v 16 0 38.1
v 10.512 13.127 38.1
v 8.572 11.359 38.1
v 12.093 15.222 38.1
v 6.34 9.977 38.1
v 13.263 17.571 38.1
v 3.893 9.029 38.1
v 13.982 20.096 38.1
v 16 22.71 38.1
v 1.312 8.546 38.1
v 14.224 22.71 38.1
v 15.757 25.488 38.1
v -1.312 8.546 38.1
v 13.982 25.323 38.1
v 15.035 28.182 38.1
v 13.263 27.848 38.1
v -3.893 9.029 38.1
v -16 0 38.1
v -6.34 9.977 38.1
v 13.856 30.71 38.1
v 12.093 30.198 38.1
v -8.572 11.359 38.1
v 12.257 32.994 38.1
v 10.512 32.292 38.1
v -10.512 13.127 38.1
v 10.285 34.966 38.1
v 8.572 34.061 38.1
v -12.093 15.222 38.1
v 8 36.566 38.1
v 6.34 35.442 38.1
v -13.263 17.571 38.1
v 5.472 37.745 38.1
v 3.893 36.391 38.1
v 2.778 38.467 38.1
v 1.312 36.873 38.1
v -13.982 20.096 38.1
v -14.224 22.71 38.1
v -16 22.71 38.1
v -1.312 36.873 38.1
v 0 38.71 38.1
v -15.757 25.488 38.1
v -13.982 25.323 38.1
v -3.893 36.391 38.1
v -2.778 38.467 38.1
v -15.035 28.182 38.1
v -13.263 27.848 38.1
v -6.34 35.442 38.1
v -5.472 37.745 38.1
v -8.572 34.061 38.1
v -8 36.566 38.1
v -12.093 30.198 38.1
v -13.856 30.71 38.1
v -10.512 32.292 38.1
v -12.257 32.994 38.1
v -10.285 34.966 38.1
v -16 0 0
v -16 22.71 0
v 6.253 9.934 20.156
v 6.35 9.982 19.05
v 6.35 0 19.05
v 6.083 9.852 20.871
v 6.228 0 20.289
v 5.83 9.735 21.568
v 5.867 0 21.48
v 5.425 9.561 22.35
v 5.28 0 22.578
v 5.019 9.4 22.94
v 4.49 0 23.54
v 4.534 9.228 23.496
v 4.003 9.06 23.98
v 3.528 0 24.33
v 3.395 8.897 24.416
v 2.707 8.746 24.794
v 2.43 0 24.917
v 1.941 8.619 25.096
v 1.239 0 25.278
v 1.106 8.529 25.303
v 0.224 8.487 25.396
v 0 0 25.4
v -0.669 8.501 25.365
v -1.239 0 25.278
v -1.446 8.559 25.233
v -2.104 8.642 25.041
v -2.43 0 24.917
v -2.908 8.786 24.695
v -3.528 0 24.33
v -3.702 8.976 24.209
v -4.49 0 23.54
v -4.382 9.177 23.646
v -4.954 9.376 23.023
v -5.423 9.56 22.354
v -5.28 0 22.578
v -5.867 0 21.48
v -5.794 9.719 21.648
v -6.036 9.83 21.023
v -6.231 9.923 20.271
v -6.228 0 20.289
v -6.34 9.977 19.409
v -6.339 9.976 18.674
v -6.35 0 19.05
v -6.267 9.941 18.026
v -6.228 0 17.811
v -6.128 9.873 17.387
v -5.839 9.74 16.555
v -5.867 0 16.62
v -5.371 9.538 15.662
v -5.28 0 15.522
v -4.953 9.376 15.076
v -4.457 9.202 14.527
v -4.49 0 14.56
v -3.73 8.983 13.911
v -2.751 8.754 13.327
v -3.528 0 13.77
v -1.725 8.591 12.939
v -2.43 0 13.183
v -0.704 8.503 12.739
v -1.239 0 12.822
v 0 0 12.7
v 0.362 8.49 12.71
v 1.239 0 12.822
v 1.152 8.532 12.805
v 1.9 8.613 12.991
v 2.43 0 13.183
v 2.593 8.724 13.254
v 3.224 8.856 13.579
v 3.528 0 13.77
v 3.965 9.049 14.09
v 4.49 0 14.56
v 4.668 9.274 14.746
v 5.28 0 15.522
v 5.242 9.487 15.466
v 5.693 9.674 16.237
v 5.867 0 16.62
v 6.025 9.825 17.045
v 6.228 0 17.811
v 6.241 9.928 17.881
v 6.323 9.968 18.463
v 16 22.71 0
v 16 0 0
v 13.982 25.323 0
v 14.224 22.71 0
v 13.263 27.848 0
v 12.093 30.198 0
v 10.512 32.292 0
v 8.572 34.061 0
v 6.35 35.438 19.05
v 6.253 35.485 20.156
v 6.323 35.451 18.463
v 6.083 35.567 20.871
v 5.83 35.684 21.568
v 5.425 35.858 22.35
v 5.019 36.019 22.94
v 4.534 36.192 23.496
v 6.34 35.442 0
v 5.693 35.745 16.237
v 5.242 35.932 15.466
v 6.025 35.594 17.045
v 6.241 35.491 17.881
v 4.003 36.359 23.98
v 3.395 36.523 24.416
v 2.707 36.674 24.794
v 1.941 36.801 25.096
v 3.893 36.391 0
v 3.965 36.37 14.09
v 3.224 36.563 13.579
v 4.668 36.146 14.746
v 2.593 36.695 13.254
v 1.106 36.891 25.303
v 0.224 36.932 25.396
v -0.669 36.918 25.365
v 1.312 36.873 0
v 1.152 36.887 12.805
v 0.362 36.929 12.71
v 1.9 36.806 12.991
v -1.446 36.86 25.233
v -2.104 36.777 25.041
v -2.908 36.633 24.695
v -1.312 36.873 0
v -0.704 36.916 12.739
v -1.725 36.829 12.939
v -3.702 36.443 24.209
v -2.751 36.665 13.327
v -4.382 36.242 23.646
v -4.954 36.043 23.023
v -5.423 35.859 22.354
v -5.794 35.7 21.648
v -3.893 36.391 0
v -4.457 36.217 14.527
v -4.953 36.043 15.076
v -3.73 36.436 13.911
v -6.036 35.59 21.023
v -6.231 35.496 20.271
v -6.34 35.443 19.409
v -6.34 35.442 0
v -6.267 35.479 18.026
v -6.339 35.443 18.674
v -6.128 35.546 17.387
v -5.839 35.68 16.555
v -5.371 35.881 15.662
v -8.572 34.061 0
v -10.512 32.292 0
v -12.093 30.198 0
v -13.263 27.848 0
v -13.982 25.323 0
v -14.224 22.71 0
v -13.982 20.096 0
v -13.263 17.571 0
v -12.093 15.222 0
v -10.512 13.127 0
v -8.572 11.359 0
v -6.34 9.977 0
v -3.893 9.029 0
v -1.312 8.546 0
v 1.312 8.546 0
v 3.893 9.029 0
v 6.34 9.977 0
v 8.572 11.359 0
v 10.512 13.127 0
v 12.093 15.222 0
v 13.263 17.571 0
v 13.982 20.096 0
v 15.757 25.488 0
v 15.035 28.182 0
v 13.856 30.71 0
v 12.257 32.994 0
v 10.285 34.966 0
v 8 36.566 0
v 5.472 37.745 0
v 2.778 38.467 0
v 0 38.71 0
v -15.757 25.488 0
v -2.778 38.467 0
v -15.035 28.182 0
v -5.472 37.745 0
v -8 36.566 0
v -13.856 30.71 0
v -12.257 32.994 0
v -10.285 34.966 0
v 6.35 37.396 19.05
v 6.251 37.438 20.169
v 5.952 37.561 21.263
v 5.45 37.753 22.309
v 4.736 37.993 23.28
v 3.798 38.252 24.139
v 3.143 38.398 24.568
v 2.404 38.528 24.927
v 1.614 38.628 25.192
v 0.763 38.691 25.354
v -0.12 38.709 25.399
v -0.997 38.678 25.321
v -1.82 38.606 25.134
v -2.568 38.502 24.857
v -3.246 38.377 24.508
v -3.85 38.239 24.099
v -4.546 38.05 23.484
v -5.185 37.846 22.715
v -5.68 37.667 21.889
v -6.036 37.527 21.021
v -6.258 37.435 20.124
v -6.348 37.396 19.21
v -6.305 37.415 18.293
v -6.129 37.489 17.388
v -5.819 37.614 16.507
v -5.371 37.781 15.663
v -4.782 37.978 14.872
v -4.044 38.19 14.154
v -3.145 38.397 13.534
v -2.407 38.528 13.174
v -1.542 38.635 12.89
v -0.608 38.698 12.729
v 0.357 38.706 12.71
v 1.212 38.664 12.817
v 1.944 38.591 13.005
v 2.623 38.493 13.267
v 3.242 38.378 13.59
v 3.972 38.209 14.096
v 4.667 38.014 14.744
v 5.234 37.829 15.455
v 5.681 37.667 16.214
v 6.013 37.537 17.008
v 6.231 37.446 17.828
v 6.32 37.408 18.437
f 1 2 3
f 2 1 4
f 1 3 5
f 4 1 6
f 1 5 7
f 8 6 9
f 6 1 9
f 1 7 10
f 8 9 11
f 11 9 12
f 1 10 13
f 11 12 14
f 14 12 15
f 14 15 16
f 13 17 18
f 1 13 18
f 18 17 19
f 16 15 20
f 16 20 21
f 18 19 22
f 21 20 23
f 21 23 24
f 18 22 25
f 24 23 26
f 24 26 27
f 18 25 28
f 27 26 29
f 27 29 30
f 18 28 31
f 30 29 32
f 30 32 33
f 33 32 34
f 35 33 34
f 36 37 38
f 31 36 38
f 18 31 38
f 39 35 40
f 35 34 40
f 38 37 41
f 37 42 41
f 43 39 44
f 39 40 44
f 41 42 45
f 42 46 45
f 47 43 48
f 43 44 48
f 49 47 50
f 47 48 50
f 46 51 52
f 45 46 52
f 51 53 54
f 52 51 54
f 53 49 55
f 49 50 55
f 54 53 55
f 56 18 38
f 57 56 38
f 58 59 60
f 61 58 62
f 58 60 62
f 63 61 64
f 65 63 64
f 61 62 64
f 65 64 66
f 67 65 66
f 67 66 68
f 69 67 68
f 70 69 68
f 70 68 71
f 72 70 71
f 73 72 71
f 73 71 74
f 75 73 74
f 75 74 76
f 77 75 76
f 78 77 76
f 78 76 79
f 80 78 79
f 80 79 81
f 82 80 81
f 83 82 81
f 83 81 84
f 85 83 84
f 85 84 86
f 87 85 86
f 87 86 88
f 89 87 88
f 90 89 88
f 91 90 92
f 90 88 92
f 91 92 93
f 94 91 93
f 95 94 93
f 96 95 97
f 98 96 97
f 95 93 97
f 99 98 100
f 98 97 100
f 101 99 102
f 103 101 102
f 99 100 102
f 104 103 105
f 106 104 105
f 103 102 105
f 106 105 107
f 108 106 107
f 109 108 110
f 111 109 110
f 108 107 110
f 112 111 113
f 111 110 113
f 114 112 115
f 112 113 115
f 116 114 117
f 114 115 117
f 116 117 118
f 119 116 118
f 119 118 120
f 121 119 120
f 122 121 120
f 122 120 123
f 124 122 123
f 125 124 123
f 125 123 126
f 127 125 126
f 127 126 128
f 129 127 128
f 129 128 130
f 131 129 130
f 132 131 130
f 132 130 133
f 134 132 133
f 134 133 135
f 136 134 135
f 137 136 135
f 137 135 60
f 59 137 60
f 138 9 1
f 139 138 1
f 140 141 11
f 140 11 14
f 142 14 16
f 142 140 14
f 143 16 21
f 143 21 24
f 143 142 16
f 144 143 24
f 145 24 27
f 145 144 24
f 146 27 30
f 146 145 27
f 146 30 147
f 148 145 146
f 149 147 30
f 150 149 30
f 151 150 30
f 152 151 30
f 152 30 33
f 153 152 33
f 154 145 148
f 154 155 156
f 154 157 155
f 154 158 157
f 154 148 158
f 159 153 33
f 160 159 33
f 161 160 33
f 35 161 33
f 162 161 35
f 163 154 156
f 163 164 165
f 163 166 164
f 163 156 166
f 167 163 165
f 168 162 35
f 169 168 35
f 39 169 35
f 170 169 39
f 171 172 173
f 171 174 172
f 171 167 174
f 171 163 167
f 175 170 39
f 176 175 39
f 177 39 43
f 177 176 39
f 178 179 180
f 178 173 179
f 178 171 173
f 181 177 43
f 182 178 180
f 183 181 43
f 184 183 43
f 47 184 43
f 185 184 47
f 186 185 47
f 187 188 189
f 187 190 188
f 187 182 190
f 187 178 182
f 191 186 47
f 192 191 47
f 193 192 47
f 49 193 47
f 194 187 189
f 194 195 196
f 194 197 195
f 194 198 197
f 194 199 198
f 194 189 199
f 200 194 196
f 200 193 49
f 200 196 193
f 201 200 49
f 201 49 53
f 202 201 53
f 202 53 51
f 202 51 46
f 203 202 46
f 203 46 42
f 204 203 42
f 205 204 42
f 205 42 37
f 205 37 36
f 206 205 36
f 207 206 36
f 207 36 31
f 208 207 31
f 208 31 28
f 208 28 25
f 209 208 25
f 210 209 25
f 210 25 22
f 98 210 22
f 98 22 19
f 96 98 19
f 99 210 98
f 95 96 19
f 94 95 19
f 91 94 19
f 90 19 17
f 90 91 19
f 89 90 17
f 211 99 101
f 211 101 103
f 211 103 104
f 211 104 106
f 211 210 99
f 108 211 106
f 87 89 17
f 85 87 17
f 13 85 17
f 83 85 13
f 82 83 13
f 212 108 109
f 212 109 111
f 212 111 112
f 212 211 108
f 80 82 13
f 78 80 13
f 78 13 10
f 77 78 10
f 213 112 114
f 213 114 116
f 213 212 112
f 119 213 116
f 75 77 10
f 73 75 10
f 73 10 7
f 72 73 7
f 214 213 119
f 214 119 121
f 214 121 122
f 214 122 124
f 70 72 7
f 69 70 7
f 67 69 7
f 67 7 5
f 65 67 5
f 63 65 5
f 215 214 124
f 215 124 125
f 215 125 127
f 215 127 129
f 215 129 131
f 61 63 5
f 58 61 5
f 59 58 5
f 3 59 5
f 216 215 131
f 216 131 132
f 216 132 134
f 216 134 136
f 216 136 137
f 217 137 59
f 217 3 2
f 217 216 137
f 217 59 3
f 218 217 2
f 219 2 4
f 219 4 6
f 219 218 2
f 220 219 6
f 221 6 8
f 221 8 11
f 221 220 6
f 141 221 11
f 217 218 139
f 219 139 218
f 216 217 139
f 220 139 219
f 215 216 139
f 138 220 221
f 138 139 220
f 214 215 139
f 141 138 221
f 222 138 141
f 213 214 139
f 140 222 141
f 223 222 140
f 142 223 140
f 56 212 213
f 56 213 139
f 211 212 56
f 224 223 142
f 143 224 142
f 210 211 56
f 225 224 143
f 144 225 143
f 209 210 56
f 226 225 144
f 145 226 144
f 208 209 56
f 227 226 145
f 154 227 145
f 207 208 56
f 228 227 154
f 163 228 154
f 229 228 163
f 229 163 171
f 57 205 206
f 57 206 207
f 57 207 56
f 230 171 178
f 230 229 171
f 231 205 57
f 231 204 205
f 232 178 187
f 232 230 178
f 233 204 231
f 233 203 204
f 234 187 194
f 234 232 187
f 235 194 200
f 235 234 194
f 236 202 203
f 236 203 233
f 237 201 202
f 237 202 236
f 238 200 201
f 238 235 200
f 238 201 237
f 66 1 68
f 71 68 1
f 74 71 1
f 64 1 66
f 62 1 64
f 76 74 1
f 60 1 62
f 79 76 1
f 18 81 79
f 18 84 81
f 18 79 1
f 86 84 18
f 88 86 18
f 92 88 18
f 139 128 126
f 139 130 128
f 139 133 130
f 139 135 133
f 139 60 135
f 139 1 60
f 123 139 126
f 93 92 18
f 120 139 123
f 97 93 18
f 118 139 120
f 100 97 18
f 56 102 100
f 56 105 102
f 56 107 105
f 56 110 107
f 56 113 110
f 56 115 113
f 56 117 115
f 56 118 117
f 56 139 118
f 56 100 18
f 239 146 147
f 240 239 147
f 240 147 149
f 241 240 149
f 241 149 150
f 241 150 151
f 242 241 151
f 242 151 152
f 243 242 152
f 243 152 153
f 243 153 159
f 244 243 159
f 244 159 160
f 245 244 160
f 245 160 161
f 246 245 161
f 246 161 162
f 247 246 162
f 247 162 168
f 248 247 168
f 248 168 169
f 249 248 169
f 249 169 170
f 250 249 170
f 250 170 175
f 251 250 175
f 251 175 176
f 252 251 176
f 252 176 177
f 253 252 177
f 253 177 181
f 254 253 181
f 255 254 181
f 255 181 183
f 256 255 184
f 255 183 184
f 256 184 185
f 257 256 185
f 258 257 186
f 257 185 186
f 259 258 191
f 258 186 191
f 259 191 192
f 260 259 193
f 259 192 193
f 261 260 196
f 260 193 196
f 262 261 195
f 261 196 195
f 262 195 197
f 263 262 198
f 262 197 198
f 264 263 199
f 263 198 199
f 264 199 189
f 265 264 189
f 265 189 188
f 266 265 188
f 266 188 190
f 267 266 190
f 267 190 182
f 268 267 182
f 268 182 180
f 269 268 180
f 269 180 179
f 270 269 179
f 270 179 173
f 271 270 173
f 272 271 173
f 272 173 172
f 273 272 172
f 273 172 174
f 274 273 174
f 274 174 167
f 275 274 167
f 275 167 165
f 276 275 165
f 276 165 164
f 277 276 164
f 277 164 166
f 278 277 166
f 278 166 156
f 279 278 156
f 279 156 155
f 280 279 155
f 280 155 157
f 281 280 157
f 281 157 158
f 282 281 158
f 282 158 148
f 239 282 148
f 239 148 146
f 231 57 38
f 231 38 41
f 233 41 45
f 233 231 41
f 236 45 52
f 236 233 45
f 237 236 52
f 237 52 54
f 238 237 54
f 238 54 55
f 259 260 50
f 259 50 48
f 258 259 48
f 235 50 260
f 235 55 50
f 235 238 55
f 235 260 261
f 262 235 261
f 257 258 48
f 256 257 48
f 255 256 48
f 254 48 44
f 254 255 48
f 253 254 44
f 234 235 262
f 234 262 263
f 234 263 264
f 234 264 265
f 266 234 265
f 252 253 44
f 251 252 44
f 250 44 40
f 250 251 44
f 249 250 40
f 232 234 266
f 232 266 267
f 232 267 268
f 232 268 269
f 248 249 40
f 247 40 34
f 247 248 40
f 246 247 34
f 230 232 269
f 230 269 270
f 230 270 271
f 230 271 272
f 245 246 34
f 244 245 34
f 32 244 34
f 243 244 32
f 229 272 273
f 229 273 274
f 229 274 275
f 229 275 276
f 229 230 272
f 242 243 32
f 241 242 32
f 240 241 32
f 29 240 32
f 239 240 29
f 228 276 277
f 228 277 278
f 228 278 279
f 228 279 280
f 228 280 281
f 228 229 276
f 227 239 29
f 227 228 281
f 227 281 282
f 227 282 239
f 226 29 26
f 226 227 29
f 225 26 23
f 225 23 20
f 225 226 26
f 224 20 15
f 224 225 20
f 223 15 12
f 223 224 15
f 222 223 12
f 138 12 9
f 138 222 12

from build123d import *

# Parameters (mm, degrees)
SKETCH1_R           = 14.224
BOSS_EXTRUDE1_DEPTH = 38.1
SKETCH2_R           = 6.35
CUT_EXTRUDE1_DEPTH  = 39.7096


with BuildPart() as part:
    # Sketch1 → Boss-Extrude1 (new body)
    with BuildSketch(Plane.XY):
        with BuildLine():
            Line((16, 0), (-16, 0))
            Line((-16, 0), (-16, 22.7096))
            ThreePointArc((-16, 22.7096), (0, 38.7096), (16, 22.7096))
            Line((16, 22.7096), (16, 0))
        make_face()
        with Locations((0, 22.7096)):
            Circle(SKETCH1_R, mode=Mode.SUBTRACT)
    extrude(amount=BOSS_EXTRUDE1_DEPTH)

    # Sketch2 → Cut-Extrude1 (cut, through all)
    with BuildSketch(Plane.XZ):
        with Locations((0, 19.05)):
            Circle(SKETCH2_R)
    extrude(amount=-CUT_EXTRUDE1_DEPTH, mode=Mode.SUBTRACT)


solid = part.part
